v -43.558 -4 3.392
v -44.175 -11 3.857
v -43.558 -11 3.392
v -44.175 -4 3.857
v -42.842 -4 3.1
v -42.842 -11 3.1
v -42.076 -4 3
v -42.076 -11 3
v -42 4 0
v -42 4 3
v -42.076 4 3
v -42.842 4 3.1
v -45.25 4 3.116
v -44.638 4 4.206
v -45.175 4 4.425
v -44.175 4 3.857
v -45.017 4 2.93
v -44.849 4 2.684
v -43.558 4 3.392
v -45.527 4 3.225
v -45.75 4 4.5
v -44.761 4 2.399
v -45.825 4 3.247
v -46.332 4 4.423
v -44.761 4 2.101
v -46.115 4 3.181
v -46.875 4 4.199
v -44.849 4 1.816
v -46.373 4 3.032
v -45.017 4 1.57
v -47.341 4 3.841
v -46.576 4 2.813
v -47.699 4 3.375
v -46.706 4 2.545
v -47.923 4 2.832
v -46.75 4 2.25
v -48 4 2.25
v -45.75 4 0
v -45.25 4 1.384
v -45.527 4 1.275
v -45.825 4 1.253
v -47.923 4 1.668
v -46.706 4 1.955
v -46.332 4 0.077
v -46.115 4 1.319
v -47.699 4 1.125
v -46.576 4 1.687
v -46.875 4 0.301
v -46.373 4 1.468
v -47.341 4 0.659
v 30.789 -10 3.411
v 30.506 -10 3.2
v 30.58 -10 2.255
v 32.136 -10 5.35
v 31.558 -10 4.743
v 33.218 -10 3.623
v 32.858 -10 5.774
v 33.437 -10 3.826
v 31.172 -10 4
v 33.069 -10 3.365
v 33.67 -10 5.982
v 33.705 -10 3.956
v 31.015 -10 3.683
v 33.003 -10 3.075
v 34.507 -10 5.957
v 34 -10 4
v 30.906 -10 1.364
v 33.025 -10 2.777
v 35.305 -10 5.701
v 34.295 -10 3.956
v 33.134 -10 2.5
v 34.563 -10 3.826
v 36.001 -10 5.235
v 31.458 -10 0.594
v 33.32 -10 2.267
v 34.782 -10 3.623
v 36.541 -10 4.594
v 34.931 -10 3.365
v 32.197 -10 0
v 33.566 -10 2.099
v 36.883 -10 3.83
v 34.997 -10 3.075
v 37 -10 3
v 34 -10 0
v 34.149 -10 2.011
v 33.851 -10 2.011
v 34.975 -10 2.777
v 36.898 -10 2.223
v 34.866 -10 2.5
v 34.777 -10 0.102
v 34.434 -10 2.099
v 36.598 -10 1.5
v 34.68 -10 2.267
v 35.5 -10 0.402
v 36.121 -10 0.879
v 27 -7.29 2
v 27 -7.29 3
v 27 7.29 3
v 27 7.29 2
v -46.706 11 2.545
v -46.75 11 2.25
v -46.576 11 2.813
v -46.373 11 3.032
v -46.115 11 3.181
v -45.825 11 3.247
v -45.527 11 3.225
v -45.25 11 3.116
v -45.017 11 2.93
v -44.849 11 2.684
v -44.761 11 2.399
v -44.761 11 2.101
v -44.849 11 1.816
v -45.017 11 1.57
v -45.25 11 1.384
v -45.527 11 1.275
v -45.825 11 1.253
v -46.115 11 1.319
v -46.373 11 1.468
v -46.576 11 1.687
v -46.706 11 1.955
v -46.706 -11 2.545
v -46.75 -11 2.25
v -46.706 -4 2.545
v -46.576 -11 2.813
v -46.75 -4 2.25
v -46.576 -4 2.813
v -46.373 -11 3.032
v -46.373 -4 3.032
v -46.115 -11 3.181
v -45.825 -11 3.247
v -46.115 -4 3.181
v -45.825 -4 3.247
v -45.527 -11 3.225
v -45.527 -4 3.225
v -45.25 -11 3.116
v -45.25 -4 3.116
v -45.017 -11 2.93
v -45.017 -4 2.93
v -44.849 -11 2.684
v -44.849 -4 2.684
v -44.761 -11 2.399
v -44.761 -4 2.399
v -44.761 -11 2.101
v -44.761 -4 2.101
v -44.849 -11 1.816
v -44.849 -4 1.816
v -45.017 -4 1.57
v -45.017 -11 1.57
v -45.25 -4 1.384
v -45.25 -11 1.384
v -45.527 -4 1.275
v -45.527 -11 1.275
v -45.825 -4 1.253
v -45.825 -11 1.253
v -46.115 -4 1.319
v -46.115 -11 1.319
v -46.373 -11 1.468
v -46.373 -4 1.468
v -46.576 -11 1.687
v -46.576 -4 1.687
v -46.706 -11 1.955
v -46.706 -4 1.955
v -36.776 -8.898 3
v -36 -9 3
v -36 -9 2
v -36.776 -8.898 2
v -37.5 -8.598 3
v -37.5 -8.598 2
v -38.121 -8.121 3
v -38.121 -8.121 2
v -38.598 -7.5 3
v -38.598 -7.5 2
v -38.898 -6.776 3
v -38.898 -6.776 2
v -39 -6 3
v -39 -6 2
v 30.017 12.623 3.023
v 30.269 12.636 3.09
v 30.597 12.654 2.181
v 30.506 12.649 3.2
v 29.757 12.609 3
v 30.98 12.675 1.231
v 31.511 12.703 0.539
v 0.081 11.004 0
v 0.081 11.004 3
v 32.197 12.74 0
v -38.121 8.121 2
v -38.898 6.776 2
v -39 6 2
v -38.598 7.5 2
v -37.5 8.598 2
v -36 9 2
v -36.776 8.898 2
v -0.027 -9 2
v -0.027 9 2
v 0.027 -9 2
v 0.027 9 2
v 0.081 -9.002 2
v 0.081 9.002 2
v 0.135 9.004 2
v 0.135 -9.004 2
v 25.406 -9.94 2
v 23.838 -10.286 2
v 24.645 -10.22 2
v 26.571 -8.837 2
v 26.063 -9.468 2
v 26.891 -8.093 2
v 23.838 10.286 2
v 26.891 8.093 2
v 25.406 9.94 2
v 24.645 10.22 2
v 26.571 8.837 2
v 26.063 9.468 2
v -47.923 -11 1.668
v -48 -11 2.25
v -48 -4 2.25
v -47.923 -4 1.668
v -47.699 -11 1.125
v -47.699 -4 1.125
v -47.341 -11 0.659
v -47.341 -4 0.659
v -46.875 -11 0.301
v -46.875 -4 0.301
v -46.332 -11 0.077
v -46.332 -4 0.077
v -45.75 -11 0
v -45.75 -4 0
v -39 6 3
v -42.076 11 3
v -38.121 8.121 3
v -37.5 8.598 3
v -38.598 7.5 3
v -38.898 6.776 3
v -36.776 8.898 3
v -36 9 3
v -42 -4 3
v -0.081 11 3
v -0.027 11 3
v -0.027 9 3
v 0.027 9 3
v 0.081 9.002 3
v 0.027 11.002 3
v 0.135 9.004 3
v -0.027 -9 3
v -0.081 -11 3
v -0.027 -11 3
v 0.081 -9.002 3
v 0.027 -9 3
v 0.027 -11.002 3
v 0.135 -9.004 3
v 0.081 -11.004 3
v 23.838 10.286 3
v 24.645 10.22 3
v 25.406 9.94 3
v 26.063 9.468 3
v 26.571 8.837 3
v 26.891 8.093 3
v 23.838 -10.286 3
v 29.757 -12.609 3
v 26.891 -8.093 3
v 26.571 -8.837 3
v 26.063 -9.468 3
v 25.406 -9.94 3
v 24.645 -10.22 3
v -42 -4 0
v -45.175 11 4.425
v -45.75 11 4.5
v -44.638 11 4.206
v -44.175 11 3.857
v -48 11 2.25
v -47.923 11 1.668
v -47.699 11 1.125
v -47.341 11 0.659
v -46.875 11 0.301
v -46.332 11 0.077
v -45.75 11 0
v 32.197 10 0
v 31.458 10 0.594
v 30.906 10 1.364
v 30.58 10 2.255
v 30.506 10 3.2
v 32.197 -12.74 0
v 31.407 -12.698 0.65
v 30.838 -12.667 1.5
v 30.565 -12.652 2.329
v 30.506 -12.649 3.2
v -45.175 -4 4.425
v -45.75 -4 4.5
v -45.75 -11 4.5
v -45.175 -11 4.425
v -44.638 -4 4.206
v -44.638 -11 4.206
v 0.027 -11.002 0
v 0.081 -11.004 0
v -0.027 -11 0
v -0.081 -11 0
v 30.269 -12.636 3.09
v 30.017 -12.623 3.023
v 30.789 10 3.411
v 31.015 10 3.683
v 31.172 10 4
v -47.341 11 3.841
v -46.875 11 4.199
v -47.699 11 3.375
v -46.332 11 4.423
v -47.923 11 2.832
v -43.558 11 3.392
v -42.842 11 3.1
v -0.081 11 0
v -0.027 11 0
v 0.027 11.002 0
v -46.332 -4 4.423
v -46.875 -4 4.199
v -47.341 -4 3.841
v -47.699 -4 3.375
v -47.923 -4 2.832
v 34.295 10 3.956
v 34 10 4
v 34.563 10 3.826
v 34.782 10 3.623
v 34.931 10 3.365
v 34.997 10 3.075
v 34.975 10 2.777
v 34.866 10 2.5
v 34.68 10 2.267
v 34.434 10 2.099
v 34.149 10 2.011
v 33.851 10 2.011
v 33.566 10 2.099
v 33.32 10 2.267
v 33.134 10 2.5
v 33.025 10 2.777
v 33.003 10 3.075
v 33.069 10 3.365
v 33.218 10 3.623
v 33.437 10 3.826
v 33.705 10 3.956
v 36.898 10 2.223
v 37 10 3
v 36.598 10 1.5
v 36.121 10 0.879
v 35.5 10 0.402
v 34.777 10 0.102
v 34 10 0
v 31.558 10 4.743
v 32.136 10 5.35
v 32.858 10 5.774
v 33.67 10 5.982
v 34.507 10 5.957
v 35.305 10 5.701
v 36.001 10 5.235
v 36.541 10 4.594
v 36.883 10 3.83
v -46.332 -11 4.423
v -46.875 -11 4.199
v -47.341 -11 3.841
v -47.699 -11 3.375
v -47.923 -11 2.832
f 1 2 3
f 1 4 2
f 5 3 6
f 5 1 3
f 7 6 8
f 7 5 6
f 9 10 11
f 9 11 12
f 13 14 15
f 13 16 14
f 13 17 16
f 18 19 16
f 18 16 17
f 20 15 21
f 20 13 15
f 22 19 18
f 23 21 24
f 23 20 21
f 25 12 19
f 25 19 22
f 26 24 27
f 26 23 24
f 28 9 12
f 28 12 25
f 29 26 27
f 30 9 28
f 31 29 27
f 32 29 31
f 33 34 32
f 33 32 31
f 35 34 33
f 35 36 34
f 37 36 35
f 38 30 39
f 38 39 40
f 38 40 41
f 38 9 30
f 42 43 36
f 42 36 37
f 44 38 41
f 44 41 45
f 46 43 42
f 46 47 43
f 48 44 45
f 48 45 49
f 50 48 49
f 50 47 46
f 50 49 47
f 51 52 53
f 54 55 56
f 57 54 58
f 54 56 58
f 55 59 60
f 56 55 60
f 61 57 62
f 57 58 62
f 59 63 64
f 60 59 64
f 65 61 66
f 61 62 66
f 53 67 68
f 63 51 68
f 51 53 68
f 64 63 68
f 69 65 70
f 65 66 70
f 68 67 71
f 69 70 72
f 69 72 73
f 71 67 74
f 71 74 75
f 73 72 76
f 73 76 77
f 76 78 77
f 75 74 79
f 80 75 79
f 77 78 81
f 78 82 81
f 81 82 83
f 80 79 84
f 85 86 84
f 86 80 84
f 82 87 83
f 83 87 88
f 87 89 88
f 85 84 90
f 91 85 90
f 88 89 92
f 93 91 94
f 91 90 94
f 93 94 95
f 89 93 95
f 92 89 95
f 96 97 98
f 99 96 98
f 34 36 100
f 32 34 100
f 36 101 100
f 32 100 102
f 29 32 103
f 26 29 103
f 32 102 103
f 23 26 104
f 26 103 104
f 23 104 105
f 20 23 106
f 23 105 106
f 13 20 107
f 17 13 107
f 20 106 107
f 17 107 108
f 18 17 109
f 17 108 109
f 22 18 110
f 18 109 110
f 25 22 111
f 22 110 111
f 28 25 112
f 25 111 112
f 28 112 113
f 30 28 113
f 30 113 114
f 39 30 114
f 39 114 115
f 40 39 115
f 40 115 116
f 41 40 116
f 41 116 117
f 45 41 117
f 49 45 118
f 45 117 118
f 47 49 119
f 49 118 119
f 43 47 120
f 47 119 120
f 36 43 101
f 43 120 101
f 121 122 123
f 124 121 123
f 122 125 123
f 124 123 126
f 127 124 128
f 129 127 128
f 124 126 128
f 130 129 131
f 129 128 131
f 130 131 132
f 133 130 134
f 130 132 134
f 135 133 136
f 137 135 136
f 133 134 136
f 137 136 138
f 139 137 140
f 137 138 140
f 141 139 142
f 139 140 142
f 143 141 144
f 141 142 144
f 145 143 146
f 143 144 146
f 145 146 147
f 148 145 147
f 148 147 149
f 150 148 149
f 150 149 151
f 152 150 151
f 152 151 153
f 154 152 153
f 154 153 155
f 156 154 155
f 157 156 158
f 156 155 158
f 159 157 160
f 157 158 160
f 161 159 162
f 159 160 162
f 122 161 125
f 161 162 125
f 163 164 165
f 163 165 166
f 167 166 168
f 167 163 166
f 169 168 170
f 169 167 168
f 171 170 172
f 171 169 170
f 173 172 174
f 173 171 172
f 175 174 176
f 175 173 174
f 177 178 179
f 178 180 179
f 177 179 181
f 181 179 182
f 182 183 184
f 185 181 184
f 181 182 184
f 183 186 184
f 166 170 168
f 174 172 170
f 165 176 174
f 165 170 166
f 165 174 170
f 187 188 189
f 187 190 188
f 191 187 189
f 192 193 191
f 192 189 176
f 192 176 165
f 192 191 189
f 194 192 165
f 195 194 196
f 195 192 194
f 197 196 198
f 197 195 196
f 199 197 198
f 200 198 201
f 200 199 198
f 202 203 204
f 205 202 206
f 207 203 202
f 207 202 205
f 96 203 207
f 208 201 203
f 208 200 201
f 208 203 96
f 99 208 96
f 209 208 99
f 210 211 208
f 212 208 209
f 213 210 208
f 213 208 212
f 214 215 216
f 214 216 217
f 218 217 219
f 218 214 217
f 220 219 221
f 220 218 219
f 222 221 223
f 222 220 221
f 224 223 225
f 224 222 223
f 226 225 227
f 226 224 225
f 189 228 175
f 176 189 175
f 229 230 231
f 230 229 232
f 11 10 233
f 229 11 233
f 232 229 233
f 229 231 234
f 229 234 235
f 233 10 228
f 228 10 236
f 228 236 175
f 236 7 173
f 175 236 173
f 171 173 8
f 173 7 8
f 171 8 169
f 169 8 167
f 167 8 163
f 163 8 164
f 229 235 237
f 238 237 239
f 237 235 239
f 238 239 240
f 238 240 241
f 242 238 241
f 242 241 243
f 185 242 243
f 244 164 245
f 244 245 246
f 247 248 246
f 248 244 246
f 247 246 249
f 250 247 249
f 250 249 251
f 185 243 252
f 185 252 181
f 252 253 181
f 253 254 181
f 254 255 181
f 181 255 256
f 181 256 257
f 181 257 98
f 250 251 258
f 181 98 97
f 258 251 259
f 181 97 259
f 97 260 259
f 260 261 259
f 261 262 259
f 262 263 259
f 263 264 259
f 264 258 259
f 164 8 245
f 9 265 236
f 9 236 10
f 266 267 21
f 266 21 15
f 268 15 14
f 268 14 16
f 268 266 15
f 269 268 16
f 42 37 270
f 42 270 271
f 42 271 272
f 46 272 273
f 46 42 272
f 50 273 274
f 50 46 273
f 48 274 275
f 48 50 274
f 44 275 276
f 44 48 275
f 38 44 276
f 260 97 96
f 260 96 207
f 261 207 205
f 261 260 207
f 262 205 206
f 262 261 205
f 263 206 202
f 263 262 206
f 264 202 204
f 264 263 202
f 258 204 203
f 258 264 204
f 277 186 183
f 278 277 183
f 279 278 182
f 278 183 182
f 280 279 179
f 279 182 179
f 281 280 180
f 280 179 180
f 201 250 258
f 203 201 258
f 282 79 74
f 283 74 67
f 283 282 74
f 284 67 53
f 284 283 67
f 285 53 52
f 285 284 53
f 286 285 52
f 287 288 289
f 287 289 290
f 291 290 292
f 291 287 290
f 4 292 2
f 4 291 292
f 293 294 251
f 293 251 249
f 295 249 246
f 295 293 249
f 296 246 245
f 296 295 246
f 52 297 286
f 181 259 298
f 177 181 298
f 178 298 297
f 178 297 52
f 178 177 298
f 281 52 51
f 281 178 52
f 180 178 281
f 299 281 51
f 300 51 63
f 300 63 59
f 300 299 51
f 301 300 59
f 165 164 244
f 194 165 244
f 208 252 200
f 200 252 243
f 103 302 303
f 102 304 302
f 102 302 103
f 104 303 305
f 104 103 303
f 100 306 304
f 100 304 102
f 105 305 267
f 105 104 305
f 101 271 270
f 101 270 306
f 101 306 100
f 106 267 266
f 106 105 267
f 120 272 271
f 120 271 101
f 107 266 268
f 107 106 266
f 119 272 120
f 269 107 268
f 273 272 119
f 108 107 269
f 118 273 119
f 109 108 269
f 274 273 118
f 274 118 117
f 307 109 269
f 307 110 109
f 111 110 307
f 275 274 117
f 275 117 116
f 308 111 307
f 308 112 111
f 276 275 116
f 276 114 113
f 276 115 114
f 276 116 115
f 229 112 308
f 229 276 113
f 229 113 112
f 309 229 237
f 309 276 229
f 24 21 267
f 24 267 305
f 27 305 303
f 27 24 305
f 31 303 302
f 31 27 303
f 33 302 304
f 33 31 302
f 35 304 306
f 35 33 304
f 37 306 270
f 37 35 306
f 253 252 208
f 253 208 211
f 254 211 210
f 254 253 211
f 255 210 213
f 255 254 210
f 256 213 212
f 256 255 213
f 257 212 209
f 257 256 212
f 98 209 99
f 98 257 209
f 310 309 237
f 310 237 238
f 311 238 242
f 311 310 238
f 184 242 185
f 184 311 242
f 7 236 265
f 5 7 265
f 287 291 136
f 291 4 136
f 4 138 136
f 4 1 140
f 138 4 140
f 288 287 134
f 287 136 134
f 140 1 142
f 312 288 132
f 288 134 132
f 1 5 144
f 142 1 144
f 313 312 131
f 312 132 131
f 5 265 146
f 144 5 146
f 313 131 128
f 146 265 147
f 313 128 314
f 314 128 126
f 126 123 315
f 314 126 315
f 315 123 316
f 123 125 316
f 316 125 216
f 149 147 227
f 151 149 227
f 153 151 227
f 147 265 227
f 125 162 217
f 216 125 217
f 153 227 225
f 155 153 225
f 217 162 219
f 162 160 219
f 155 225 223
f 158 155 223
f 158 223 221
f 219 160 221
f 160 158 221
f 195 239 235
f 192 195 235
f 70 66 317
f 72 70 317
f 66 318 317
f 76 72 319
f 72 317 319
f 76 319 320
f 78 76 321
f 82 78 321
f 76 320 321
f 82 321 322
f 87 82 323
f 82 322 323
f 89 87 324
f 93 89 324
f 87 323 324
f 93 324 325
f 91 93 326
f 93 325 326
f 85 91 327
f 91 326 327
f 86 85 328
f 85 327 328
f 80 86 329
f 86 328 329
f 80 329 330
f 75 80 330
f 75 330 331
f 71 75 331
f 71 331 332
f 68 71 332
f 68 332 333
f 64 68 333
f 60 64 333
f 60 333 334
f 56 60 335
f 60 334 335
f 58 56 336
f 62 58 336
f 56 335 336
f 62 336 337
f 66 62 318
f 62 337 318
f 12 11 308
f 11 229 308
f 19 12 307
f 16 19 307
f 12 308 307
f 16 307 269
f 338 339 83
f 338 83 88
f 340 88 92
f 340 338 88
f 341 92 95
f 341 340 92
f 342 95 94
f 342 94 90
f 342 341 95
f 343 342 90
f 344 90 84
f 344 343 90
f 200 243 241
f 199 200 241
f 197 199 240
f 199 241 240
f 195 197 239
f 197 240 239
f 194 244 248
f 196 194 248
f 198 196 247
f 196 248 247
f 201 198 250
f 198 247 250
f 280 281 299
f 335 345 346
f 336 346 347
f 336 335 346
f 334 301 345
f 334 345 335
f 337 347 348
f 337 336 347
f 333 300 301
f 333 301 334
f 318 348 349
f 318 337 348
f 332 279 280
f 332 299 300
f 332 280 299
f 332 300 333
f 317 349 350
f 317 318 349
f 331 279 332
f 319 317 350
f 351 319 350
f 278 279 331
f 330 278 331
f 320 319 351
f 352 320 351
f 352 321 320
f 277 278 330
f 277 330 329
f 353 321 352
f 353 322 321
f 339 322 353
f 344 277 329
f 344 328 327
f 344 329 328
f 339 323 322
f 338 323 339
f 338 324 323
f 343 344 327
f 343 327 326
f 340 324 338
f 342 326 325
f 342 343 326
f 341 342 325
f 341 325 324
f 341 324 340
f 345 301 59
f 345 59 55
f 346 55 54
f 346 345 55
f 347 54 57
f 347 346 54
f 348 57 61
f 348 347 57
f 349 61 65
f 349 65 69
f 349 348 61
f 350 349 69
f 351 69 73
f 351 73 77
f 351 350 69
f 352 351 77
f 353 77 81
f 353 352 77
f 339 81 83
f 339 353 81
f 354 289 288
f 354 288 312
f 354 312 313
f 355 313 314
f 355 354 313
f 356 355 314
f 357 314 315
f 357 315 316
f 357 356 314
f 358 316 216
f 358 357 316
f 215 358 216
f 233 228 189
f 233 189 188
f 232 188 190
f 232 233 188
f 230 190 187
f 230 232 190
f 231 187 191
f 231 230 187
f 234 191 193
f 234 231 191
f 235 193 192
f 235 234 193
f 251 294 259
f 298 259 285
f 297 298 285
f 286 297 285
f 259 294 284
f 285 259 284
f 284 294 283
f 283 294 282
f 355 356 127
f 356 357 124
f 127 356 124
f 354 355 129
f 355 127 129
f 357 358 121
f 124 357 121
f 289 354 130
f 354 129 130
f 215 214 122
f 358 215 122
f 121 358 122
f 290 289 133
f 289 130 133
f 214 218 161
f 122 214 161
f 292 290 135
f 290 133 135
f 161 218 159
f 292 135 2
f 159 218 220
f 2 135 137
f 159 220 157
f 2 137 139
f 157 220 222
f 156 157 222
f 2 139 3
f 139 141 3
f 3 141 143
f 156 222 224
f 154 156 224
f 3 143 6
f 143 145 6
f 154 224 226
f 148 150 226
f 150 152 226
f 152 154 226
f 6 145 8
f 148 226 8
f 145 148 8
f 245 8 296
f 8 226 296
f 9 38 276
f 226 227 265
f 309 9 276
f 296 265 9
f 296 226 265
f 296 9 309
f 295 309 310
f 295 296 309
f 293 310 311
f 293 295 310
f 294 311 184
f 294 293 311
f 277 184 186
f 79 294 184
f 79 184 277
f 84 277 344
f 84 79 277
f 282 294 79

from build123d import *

# Parameters (mm, degrees)
SALIENTE_EXTRUIR1_DEPTH = 3
CORTAR_EXTRUIR1_DEPTH   = 1
CROQUIS8_R              = 3
SALIENTE_EXTRUIR2_DEPTH = 12.5
REDONDEO1_R             = 3
CROQUIS9_R              = 3.5
CORTAR_EXTRUIR3_DEPTH   = 3
REDONDEO2_R             = 1.5
CROQUIS10_R             = 1
CORTAR_EXTRUIR4_DEPTH   = 15
REDONDEO3_R             = 3
SALIENTE_EXTRUIR3_DEPTH = 11
REDONDEO4_R             = 2.25
CROQUIS12_W             = 10
CROQUIS12_H             = 8
CORTAR_EXTRUIR5_DEPTH   = 22
CROQUIS13_R             = 1
CORTAR_EXTRUIR6_DEPTH   = 26
REDONDEO5_R             = 3
REDONDEO6_R             = 3


# Some blends are built 0.0001 mm under size
with BuildPart() as part:
    # Croquis1 → Saliente-Extruir1 (new body)
    with BuildSketch(Plane.XY):
        Polygon((0, 11), (-48, 11), (-48, -11), (0, -11), (37, -13), (37, 13), align=None)
    extrude(amount=SALIENTE_EXTRUIR1_DEPTH)

    # Croquis7 → Cortar-Extruir1 (cut)
    with BuildSketch(Plane.XY.offset(3)):
        Polygon((-39, 9), (-39, -9), (0.054014627, -9), (27, -10.45653975), (27, 10.45653975), (0.054014627, 9), align=None)
    extrude(amount=-CORTAR_EXTRUIR1_DEPTH, mode=Mode.SUBTRACT)

    # Croquis8 → Saliente-Extruir2 (add, symmetric)
    with BuildSketch(Plane(origin=(0, 0, 0), x_dir=(1, 0, 0), z_dir=(0, 1, 0))):
        with Locations((34, -3)):
            Circle(CROQUIS8_R)
    extrude(amount=SALIENTE_EXTRUIR2_DEPTH, both=True)

    # Redondeo1
    redondeo1_edges = [part.edges().sort_by_distance(p)[0] for p in [
        (37, 0, 0),
    ]]
    fillet(redondeo1_edges, radius=REDONDEO1_R - 0.0001)  # a hair under: the kernel refuses the full size

    # Croquis9 → Cortar-Extruir3 (cut)
    with BuildSketch(Plane(origin=(0, -13, 0), x_dir=(1, 0, 0), z_dir=(0, 1, 0))):
        with Locations((34, -3)):
            Circle(CROQUIS9_R)
    cortar_extruir3 = extrude(amount=CORTAR_EXTRUIR3_DEPTH, mode=Mode.SUBTRACT)

    # Simetría1: Cortar-Extruir3 across plane
    add(cortar_extruir3.mirror(Plane.ZX), mode=Mode.SUBTRACT)

    # Redondeo2
    redondeo2_edges = [part.edges().sort_by_distance(p)[0] for p in [
        (31, 0, 3),
    ]]
    fillet(redondeo2_edges, radius=REDONDEO2_R)

    # Croquis10 → Cortar-Extruir4 (cut, symmetric)
    with BuildSketch(Plane(origin=(0, 0, 0), x_dir=(1, 0, 0), z_dir=(0, 1, 0))):
        with Locations(Location((34, -3, 0), (0, 0, 270))):
            Circle(CROQUIS10_R)
    extrude(amount=CORTAR_EXTRUIR4_DEPTH, both=True, mode=Mode.SUBTRACT)

    # Redondeo3
    # the kernel refuses this fillet: 3 mm, written as the material it adds along each edge
    with BuildSketch(Plane(origin=(-39, -9, 3), x_dir=(0, 1, 0), z_dir=(0, 0, -1))) as redondeo3_piece_1:
        with BuildLine():
            CenterArc((REDONDEO3_R, REDONDEO3_R), REDONDEO3_R, 180, 90)
            Line((0, REDONDEO3_R), (0, 0))
            Line((0, 0), (REDONDEO3_R, 0))
        make_face()
    extrude(amount=1)
    with BuildSketch(Plane(origin=(-39, 9, 3), x_dir=(0, -1, 0), z_dir=(0, 0, -1))) as redondeo3_piece_2:
        with BuildLine():
            CenterArc((REDONDEO3_R, -REDONDEO3_R), REDONDEO3_R, 90, 90)
            Line((0, -REDONDEO3_R), (0, 0))
            Line((0, 0), (REDONDEO3_R, 0))
        make_face()
    extrude(amount=1)
    with BuildSketch(Plane(origin=(27, 10.45653975, 3), x_dir=(-0.9985422732775083, -0.053975258015000575, 0), z_dir=(0, 0, -1))) as redondeo3_piece_3:
        with BuildLine():
            CenterArc((REDONDEO3_R * 1.05551390885, -REDONDEO3_R), REDONDEO3_R, 90, 93.094058059)
            Line((REDONDEO3_R * 0.0569716355684, -REDONDEO3_R * 1.05397525801), (0, 0))
            Line((0, 0), (REDONDEO3_R * 1.05551390885, 0))
        make_face()
    extrude(amount=1)
    with BuildSketch(Plane(origin=(27, -10.45653975, 3), x_dir=(-0.9985422732775082, 0.053975258015002685, 0), z_dir=(0, 0, -1))) as redondeo3_piece_4:
        with BuildLine():
            CenterArc((REDONDEO3_R * 1.05551390885, REDONDEO3_R), REDONDEO3_R, 176.905941941, 93.094058059)
            Line((REDONDEO3_R * 0.0569716355684, REDONDEO3_R * 1.05397525802), (0, 0))
            Line((0, 0), (REDONDEO3_R * 1.05551390885, 0))
        make_face()
    extrude(amount=1)
    # the kernel refuses this fillet: 3 mm, written as the material it takes off along each edge
    with BuildSketch(Plane(origin=(0.054014627, 9, 3.202554852), x_dir=(-1, 0, 0), z_dir=(0, 0, -1))) as redondeo3_2_piece_1:
        with BuildLine():
            CenterArc((REDONDEO3_R * 0.0270073136489, REDONDEO3_R), REDONDEO3_R, 266.905941941, 3.094058059)
            Line((-REDONDEO3_R * 0.0269679443661, REDONDEO3_R * 0.00145772672249), (0, 0))
            Line((0, 0), (REDONDEO3_R * 0.0270073136489, 0))
        make_face()
    extrude(amount=1.202554852, mode=Mode.SUBTRACT)
    with BuildSketch(Plane(origin=(0.054014627, -9, 3.202554852), x_dir=(-1, 0, 0), z_dir=(0, 0, -1))) as redondeo3_2_piece_2:
        with BuildLine():
            CenterArc((REDONDEO3_R * 0.0270073136489, -REDONDEO3_R), REDONDEO3_R, 90, 3.094058059)
            Line((-REDONDEO3_R * 0.0269679443661, -REDONDEO3_R * 0.00145772672249), (0, 0))
            Line((0, 0), (REDONDEO3_R * 0.0270073136489, 0))
        make_face()
    extrude(amount=1.202554852, mode=Mode.SUBTRACT)

    # Croquis11 → Saliente-Extruir3 (add, symmetric)
    with BuildSketch(Plane(origin=(0, 0, 0), x_dir=(1, 0, 0), z_dir=(0, 1, 0))):
        with BuildLine():
            Line((-48, -4.5), (-45.75, -4.5))
            ThreePointArc((-45.75, -4.5), (-44.159009742, -3.840990258), (-43.5, -2.25))
            Line((-43.5, -2.25), (-43.5, 0))
            Line((-43.5, 0), (-48, 0))
            Line((-48, 0), (-48, -4.5))
        make_face()
    extrude(amount=SALIENTE_EXTRUIR3_DEPTH, both=True)

    # Redondeo4
    redondeo4_edges = [part.edges().sort_by_distance(p)[0] for p in [
        (-48, 0, 0),
        (-48, 0, 4.5),
    ]]
    fillet(redondeo4_edges, radius=REDONDEO4_R - 0.0001)  # a hair under: the kernel refuses the full size

    # Croquis12 → Cortar-Extruir5 (cut)
    with BuildSketch(Plane(origin=(0, 0, 0), x_dir=(-1, 0, 0), z_dir=(0, 0, -1))):
        with Locations((47, 0)):
            Rectangle(CROQUIS12_W, CROQUIS12_H)
    extrude(amount=-CORTAR_EXTRUIR5_DEPTH, mode=Mode.SUBTRACT)

    # Croquis13 → Cortar-Extruir6 (cut, symmetric)
    with BuildSketch(Plane(origin=(0, 0, 0), x_dir=(1, 0, 0), z_dir=(0, 1, 0))):
        with Locations(Location((-45.75, -2.25, 0), (0, 0, 180))):
            Circle(CROQUIS13_R)
    extrude(amount=CORTAR_EXTRUIR6_DEPTH, both=True, mode=Mode.SUBTRACT)

    # Redondeo5
    redondeo5_edges = [part.edges().sort_by_distance(p)[0] for p in [
        (-43.628679656, 7.5, 3),
        (-43.628679656, -7.5, 3),
    ]]
    fillet(redondeo5_edges, radius=REDONDEO5_R)

    # Redondeo6
    # the kernel refuses this fillet: 3 mm, written as the material it adds along each edge
    with BuildSketch(Plane(origin=(0, 11, 0), x_dir=(-1, 0, 0), z_dir=(0, 0, 1))) as redondeo6_piece_1:
        with BuildLine():
            CenterArc((REDONDEO6_R * 0.0270073136489, -REDONDEO6_R), REDONDEO6_R, 90, 3.094058059)
            Line((-REDONDEO6_R * 0.0269679443661, -REDONDEO6_R * 0.00145772672249), (0, 0))
            Line((0, 0), (REDONDEO6_R * 0.0270073136489, 0))
        make_face()
    extrude(amount=3)
    with BuildSketch(Plane(origin=(0, -11, 0), x_dir=(-1, 0, 0), z_dir=(0, 0, 1))) as redondeo6_piece_2:
        with BuildLine():
            CenterArc((REDONDEO6_R * 0.0270073136489, REDONDEO6_R), REDONDEO6_R, 266.905941941, 3.094058059)
            Line((-REDONDEO6_R * 0.0269679443661, REDONDEO6_R * 0.00145772672249), (0, 0))
            Line((0, 0), (REDONDEO6_R * 0.0270073136489, 0))
        make_face()
    extrude(amount=3)


solid = part.part
